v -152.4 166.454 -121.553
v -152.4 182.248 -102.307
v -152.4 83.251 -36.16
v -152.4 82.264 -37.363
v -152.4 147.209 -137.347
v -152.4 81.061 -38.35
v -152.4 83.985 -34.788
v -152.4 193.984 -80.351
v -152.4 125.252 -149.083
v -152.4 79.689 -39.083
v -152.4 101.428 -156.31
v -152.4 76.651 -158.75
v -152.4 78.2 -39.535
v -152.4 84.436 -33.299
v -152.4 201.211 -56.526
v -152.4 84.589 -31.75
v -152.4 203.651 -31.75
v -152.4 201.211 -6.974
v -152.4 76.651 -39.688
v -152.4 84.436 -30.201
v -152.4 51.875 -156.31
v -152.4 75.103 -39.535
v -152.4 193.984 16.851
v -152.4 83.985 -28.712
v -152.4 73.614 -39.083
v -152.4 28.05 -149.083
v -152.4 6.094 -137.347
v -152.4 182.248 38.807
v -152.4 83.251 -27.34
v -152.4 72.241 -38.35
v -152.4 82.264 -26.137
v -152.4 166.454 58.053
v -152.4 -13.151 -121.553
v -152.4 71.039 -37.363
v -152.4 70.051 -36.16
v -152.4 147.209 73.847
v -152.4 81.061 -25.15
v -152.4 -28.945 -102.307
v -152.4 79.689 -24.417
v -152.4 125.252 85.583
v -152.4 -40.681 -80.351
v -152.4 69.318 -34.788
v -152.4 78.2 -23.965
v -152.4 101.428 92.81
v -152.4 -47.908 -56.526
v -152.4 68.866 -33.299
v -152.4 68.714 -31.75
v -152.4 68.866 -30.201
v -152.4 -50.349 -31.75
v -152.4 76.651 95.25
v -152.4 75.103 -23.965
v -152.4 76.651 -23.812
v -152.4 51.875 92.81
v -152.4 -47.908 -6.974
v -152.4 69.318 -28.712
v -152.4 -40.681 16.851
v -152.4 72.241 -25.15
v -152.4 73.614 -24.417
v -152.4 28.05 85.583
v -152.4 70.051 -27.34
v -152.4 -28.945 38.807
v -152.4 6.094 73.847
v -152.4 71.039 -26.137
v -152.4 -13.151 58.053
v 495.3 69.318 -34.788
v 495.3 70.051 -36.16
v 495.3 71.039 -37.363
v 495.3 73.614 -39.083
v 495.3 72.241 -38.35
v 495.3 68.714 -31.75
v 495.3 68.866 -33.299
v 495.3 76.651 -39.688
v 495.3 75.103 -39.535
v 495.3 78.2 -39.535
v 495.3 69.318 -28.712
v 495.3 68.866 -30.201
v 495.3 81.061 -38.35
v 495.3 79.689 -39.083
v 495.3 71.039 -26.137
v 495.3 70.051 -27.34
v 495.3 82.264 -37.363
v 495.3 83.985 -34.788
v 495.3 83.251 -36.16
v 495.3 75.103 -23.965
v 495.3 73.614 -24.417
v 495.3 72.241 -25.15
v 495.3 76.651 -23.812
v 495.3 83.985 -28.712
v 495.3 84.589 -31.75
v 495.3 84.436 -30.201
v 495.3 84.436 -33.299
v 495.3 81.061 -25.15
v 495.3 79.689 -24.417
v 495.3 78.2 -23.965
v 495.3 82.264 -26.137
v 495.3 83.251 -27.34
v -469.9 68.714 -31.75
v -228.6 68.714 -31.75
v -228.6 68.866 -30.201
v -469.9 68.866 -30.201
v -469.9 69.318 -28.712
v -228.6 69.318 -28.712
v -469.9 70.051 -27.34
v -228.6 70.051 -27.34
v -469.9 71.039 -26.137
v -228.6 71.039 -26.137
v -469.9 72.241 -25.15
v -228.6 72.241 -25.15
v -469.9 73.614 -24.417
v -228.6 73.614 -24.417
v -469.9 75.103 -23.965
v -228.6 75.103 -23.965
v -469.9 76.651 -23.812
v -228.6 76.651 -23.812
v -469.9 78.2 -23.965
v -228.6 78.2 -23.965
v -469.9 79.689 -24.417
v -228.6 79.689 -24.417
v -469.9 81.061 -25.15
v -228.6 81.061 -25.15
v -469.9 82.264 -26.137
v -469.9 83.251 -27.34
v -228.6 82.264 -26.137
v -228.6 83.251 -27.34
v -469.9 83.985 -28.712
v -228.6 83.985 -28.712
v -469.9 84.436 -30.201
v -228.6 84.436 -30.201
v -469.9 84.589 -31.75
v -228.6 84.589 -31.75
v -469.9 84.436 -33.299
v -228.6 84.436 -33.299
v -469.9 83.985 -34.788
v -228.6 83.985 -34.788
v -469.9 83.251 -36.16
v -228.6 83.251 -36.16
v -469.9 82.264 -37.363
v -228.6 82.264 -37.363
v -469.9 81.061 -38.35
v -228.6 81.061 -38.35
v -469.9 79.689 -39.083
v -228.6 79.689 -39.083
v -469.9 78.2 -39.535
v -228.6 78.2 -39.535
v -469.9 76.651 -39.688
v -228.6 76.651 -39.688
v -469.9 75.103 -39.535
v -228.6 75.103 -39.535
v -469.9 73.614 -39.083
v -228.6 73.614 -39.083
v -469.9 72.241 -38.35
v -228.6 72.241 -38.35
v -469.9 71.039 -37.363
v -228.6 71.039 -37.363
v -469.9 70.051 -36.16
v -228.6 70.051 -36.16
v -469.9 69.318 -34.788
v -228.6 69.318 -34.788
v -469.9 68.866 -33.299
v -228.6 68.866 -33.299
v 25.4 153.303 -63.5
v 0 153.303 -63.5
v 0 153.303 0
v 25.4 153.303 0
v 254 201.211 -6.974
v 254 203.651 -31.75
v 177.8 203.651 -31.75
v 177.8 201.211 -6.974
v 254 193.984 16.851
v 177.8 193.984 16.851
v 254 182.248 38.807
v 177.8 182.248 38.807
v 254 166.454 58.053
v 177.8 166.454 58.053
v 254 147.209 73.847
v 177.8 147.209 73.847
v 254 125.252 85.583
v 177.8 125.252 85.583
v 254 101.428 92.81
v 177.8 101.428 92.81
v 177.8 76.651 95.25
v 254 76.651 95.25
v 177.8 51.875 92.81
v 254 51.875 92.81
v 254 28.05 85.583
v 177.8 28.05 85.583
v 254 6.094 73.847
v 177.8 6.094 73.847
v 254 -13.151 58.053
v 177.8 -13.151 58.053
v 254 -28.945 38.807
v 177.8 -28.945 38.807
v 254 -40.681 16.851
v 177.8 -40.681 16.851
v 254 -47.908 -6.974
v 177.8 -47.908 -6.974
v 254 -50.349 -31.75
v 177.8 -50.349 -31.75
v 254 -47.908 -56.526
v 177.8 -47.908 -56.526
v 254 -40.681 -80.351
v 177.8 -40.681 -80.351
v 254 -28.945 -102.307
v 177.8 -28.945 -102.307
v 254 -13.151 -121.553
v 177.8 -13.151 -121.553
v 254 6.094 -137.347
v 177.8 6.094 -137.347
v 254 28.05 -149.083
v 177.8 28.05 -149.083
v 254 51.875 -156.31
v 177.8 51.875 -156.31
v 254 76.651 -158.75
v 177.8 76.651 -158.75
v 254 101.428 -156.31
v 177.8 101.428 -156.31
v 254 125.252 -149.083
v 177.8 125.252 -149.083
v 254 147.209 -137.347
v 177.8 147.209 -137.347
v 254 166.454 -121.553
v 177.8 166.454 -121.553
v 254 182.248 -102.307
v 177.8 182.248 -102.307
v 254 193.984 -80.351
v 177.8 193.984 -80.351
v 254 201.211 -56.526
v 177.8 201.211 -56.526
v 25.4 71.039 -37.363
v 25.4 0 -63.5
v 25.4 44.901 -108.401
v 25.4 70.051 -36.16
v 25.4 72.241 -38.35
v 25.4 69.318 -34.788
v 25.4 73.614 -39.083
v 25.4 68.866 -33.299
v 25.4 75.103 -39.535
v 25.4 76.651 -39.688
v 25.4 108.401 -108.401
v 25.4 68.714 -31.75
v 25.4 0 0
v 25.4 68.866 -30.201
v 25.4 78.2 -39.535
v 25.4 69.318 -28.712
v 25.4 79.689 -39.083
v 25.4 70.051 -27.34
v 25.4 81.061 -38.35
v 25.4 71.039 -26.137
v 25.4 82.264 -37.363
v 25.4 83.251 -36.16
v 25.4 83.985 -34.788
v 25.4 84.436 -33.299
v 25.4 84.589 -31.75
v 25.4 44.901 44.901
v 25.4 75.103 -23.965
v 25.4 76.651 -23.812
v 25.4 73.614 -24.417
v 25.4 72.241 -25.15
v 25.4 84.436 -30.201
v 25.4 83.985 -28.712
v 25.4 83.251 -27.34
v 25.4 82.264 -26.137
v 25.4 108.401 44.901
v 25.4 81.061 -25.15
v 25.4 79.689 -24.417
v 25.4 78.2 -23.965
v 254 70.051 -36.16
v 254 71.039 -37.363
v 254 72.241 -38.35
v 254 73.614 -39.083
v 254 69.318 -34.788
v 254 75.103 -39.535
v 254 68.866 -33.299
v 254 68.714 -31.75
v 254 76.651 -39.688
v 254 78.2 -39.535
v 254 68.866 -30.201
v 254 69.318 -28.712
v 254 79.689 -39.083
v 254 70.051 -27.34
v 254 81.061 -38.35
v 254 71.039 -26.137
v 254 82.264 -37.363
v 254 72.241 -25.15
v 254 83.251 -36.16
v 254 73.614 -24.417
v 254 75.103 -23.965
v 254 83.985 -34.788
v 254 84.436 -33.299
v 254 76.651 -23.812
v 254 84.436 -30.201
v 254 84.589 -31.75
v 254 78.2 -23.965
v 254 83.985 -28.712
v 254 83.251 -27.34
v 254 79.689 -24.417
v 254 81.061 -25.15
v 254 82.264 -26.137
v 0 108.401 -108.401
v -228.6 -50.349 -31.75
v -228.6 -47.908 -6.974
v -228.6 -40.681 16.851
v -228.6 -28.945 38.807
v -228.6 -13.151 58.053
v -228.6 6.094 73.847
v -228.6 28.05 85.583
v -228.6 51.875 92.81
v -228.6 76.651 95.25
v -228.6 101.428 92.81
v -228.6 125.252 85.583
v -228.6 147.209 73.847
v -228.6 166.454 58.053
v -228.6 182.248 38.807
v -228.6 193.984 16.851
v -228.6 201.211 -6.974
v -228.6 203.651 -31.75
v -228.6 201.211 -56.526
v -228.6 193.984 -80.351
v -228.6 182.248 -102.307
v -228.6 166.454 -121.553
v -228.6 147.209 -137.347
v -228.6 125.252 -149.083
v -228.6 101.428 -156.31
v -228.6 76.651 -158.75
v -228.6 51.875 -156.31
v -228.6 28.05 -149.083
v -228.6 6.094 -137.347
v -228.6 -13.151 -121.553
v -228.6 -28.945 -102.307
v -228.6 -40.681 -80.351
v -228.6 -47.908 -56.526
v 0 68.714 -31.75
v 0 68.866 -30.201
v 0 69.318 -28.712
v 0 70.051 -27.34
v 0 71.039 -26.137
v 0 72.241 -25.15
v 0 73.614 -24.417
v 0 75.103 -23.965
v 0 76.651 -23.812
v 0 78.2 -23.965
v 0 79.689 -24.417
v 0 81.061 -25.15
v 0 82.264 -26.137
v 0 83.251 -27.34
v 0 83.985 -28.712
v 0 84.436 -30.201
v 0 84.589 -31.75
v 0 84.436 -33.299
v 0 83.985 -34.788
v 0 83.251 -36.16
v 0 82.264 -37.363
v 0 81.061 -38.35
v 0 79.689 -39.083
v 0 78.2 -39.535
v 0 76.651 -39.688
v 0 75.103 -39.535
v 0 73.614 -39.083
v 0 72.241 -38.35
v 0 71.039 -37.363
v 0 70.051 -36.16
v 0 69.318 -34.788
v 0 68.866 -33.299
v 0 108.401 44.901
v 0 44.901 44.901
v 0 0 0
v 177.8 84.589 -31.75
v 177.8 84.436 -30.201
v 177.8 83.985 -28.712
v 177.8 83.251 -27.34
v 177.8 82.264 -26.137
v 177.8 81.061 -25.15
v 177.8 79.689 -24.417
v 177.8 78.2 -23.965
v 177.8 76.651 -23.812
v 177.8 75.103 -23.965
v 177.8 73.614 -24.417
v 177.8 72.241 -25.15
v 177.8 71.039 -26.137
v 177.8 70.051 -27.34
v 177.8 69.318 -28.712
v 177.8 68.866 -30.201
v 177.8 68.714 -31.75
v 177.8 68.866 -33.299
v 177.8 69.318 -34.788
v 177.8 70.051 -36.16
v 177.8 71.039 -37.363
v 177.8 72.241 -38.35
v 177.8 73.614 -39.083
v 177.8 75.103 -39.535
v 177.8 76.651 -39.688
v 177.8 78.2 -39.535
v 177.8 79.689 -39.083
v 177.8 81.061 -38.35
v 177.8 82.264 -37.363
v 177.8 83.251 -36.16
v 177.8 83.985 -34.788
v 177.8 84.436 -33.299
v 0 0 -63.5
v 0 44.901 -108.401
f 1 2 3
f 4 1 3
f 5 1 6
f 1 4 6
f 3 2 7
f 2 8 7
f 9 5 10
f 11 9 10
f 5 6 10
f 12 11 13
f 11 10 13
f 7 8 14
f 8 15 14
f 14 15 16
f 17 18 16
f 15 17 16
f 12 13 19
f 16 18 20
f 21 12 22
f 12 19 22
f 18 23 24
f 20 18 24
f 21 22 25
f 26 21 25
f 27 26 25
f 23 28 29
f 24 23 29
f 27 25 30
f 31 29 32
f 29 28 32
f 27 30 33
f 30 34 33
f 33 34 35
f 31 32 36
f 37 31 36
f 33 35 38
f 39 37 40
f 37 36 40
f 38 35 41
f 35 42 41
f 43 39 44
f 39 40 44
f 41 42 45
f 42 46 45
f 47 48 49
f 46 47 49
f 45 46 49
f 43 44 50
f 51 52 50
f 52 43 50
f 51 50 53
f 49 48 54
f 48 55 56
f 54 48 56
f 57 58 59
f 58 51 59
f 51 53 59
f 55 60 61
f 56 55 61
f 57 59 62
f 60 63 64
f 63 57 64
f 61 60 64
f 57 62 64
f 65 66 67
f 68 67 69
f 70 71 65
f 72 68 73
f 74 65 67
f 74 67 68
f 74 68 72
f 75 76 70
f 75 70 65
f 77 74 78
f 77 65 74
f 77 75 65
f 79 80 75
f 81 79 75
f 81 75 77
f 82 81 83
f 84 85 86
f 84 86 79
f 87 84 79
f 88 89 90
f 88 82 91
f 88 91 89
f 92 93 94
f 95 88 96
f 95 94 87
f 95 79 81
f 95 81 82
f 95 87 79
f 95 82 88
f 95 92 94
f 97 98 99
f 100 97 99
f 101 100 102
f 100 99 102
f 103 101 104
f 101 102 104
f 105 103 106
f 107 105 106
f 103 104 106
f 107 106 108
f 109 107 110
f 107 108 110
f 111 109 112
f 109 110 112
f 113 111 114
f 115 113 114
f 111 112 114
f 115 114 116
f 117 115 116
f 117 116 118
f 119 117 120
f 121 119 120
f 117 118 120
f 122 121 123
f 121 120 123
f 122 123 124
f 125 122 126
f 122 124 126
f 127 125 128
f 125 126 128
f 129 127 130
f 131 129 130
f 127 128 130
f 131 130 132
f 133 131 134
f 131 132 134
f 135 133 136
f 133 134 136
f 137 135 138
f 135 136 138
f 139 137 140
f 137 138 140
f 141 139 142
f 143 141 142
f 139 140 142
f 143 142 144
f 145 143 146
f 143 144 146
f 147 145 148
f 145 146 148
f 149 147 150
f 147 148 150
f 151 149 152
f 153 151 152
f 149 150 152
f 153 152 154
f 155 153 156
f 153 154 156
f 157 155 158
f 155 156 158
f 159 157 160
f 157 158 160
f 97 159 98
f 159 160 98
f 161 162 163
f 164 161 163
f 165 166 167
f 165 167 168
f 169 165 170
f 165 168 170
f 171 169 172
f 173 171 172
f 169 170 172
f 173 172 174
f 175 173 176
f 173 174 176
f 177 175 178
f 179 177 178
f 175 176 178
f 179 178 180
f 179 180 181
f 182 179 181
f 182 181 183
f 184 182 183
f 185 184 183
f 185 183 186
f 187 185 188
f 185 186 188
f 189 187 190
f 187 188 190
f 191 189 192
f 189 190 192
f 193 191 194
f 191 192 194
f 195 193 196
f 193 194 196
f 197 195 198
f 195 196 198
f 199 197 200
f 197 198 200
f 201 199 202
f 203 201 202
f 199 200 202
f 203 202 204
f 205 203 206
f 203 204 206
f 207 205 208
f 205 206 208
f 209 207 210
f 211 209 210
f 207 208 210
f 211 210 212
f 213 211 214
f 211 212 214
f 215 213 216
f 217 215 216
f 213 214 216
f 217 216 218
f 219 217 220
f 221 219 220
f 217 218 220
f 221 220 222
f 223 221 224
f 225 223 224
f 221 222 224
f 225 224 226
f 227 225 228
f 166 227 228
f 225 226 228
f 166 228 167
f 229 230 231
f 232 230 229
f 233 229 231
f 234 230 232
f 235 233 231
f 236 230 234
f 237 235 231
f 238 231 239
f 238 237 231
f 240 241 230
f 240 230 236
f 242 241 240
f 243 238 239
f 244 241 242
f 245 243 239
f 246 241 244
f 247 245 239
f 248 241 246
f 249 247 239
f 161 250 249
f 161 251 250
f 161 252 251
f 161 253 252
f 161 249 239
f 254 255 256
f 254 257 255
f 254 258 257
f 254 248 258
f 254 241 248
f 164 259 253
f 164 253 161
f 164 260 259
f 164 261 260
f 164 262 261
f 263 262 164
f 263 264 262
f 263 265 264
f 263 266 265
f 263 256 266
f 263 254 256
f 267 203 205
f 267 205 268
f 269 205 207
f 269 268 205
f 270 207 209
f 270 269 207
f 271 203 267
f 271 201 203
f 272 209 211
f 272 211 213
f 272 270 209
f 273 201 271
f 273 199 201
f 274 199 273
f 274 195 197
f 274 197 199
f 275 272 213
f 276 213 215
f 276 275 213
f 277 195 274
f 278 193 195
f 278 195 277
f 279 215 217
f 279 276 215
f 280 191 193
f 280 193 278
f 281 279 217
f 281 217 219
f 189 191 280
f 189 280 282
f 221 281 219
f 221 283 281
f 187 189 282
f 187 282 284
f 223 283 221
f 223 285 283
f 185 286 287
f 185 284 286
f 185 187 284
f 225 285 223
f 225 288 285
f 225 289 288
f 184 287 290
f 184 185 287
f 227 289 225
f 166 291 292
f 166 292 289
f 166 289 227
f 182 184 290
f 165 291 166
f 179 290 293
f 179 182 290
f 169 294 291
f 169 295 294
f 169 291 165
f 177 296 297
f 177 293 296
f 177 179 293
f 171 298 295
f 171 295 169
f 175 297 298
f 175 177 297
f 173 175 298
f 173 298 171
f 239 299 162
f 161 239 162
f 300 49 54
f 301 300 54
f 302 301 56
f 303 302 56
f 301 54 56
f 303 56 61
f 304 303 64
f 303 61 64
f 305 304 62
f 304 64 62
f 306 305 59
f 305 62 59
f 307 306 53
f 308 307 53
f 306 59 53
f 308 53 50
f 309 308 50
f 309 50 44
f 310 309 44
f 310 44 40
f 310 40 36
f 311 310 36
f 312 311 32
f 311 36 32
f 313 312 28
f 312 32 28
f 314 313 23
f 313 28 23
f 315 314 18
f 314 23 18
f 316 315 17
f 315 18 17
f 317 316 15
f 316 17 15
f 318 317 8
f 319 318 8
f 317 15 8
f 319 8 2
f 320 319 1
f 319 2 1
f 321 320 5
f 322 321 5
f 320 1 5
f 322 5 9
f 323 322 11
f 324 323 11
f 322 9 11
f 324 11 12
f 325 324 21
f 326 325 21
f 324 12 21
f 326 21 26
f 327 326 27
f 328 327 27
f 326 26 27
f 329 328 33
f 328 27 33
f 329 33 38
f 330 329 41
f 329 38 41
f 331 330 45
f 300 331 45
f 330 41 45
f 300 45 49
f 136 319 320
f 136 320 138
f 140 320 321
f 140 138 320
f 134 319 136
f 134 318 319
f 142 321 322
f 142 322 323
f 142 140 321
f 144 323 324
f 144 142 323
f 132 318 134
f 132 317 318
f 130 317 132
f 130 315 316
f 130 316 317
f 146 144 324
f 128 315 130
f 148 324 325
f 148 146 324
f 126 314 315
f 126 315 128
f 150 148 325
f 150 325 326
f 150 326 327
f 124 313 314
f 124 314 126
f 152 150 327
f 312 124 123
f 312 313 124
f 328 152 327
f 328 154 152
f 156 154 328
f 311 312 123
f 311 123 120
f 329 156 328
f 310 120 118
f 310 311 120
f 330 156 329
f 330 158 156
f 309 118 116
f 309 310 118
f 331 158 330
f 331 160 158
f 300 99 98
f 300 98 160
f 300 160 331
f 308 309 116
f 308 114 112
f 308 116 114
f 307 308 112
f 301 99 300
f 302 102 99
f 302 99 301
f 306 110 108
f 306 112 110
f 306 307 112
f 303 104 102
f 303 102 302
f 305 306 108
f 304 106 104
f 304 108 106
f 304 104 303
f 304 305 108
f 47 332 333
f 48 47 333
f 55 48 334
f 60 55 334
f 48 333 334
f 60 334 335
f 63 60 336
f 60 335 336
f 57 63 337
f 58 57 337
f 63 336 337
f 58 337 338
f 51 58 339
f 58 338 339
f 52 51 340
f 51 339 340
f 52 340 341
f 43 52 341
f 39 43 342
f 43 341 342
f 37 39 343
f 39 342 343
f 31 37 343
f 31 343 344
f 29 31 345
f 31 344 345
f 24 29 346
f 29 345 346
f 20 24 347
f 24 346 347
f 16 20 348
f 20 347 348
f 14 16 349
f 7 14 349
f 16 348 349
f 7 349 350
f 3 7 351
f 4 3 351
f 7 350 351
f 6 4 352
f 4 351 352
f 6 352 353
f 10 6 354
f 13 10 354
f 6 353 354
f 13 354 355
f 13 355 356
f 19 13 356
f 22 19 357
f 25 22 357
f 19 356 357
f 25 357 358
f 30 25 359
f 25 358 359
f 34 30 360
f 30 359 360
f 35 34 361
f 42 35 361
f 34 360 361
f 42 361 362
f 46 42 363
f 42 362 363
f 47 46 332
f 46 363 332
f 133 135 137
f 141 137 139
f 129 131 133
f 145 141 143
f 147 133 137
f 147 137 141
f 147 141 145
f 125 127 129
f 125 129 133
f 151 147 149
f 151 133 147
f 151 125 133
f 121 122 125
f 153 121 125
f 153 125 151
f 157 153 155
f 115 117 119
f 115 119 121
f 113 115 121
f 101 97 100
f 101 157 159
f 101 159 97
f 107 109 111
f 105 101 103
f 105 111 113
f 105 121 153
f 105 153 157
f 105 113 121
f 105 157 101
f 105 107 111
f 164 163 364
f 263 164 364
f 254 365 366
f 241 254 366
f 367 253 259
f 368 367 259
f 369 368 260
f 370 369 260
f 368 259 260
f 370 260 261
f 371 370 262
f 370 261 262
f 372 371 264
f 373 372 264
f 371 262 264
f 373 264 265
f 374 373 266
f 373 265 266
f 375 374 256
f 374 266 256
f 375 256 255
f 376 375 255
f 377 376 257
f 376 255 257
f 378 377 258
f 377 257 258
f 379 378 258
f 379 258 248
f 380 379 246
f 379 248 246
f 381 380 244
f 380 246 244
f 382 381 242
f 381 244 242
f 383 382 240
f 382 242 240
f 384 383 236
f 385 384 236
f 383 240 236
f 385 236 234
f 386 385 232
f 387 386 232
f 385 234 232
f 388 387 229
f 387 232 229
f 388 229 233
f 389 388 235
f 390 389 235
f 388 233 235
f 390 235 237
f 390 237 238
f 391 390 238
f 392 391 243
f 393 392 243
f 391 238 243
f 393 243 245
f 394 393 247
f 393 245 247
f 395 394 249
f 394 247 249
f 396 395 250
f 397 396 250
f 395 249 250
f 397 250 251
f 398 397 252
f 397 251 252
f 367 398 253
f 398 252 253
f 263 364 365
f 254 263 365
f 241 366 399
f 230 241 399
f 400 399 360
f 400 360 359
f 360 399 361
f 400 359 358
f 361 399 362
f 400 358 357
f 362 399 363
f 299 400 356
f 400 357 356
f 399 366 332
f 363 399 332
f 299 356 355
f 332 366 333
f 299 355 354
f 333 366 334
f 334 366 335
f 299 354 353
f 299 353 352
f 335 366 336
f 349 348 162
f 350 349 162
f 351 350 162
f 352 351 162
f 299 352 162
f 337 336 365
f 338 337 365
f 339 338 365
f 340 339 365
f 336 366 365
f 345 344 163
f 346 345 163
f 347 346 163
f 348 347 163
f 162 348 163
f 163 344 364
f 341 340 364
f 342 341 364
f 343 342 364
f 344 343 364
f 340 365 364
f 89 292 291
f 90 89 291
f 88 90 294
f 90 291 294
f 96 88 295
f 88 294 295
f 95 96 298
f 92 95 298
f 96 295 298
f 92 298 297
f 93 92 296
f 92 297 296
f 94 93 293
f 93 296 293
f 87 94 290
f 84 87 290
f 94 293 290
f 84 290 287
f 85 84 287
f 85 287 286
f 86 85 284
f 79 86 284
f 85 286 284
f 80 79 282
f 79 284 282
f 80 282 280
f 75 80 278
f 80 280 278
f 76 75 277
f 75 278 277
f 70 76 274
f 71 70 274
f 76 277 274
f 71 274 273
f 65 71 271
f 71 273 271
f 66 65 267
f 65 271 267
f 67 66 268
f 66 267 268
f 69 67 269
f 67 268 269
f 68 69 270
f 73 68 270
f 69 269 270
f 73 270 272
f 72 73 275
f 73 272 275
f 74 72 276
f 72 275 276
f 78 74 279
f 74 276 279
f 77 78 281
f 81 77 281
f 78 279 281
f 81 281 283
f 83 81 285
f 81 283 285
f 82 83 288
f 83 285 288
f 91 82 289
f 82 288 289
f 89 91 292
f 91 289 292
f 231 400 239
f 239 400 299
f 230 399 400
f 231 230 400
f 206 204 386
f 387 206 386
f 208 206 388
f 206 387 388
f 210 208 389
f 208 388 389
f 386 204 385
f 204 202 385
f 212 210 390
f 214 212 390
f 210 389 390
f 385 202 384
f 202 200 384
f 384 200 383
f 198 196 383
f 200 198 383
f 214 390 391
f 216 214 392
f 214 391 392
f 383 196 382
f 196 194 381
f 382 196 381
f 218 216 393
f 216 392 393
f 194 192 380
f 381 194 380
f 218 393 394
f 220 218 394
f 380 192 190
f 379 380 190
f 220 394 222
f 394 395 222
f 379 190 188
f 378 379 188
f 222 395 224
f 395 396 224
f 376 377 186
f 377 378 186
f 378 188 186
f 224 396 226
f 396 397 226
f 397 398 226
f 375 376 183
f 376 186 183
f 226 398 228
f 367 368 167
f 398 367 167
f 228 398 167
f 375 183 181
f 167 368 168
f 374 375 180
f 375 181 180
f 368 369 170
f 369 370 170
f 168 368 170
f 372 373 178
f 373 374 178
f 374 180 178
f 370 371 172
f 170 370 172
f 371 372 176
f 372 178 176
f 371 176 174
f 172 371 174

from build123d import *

# Parameters (mm, degrees)
F1_DEPTH  = 25.4
F2_R      = 7.9375
F3_DEPTH  = 152.4
F4_R      = 127
F5_DEPTH  = 76.2
F6_R      = 7.9375
F7_DEPTH  = 241.3
F8_R      = 7.9375
F9_DEPTH  = 152.4
F10_R     = 127
F11_DEPTH = 76.2
F12_R     = 7.9375
F13_DEPTH = 241.3


with BuildPart() as f1:
    # F0 (on Right) → F1 (new body)
    with BuildSketch(Plane.YZ):
        Polygon((44.901281, 44.901281), (0, 0), (0, -63.5), (44.901281, -108.401281), (108.401281, -108.401281), (153.302561, -63.5), (153.302561, 0), (108.401281, 44.901281), align=None)
    extrude(amount=F1_DEPTH)

    # F2 (on face) → F3 (join)
    with BuildSketch(Plane.YZ.offset(25.4)):
        with Locations((76.651281, -31.75)):
            Circle(F2_R)
    extrude(amount=F3_DEPTH)

    # F4 (on face) → F5 (join)
    with BuildSketch(Plane.YZ.offset(177.8)):
        with Locations((76.651281, -31.75)):
            Circle(F4_R)
    extrude(amount=F5_DEPTH)

    # F6 (on face) → F7 (join)
    with BuildSketch(Plane.YZ.offset(254)):
        with Locations((76.651281, -31.75)):
            Circle(F6_R)
    extrude(amount=F7_DEPTH)

    # F8 (on face) → F9 (join)
    with BuildSketch(Plane(origin=(0, 0, 0), x_dir=(0, -1, 0), z_dir=(-1, 0, 0))):
        with Locations((-76.651281, -31.75)):
            Circle(F8_R)
    extrude(amount=F9_DEPTH)

    # F10 (on face) → F11 (join)
    with BuildSketch(Plane(origin=(-152.4, 0, 0), x_dir=(0, -1, 0), z_dir=(-1, 0, 0))):
        with Locations((-76.651281, -31.75)):
            Circle(F10_R)
    extrude(amount=F11_DEPTH)

    # F12 (on face) → F13 (join)
    with BuildSketch(Plane(origin=(-228.6, 0, 0), x_dir=(0, -1, 0), z_dir=(-1, 0, 0))):
        with Locations((-76.651281, -31.75)):
            Circle(F12_R)
    extrude(amount=F13_DEPTH)


solid = f1.part
